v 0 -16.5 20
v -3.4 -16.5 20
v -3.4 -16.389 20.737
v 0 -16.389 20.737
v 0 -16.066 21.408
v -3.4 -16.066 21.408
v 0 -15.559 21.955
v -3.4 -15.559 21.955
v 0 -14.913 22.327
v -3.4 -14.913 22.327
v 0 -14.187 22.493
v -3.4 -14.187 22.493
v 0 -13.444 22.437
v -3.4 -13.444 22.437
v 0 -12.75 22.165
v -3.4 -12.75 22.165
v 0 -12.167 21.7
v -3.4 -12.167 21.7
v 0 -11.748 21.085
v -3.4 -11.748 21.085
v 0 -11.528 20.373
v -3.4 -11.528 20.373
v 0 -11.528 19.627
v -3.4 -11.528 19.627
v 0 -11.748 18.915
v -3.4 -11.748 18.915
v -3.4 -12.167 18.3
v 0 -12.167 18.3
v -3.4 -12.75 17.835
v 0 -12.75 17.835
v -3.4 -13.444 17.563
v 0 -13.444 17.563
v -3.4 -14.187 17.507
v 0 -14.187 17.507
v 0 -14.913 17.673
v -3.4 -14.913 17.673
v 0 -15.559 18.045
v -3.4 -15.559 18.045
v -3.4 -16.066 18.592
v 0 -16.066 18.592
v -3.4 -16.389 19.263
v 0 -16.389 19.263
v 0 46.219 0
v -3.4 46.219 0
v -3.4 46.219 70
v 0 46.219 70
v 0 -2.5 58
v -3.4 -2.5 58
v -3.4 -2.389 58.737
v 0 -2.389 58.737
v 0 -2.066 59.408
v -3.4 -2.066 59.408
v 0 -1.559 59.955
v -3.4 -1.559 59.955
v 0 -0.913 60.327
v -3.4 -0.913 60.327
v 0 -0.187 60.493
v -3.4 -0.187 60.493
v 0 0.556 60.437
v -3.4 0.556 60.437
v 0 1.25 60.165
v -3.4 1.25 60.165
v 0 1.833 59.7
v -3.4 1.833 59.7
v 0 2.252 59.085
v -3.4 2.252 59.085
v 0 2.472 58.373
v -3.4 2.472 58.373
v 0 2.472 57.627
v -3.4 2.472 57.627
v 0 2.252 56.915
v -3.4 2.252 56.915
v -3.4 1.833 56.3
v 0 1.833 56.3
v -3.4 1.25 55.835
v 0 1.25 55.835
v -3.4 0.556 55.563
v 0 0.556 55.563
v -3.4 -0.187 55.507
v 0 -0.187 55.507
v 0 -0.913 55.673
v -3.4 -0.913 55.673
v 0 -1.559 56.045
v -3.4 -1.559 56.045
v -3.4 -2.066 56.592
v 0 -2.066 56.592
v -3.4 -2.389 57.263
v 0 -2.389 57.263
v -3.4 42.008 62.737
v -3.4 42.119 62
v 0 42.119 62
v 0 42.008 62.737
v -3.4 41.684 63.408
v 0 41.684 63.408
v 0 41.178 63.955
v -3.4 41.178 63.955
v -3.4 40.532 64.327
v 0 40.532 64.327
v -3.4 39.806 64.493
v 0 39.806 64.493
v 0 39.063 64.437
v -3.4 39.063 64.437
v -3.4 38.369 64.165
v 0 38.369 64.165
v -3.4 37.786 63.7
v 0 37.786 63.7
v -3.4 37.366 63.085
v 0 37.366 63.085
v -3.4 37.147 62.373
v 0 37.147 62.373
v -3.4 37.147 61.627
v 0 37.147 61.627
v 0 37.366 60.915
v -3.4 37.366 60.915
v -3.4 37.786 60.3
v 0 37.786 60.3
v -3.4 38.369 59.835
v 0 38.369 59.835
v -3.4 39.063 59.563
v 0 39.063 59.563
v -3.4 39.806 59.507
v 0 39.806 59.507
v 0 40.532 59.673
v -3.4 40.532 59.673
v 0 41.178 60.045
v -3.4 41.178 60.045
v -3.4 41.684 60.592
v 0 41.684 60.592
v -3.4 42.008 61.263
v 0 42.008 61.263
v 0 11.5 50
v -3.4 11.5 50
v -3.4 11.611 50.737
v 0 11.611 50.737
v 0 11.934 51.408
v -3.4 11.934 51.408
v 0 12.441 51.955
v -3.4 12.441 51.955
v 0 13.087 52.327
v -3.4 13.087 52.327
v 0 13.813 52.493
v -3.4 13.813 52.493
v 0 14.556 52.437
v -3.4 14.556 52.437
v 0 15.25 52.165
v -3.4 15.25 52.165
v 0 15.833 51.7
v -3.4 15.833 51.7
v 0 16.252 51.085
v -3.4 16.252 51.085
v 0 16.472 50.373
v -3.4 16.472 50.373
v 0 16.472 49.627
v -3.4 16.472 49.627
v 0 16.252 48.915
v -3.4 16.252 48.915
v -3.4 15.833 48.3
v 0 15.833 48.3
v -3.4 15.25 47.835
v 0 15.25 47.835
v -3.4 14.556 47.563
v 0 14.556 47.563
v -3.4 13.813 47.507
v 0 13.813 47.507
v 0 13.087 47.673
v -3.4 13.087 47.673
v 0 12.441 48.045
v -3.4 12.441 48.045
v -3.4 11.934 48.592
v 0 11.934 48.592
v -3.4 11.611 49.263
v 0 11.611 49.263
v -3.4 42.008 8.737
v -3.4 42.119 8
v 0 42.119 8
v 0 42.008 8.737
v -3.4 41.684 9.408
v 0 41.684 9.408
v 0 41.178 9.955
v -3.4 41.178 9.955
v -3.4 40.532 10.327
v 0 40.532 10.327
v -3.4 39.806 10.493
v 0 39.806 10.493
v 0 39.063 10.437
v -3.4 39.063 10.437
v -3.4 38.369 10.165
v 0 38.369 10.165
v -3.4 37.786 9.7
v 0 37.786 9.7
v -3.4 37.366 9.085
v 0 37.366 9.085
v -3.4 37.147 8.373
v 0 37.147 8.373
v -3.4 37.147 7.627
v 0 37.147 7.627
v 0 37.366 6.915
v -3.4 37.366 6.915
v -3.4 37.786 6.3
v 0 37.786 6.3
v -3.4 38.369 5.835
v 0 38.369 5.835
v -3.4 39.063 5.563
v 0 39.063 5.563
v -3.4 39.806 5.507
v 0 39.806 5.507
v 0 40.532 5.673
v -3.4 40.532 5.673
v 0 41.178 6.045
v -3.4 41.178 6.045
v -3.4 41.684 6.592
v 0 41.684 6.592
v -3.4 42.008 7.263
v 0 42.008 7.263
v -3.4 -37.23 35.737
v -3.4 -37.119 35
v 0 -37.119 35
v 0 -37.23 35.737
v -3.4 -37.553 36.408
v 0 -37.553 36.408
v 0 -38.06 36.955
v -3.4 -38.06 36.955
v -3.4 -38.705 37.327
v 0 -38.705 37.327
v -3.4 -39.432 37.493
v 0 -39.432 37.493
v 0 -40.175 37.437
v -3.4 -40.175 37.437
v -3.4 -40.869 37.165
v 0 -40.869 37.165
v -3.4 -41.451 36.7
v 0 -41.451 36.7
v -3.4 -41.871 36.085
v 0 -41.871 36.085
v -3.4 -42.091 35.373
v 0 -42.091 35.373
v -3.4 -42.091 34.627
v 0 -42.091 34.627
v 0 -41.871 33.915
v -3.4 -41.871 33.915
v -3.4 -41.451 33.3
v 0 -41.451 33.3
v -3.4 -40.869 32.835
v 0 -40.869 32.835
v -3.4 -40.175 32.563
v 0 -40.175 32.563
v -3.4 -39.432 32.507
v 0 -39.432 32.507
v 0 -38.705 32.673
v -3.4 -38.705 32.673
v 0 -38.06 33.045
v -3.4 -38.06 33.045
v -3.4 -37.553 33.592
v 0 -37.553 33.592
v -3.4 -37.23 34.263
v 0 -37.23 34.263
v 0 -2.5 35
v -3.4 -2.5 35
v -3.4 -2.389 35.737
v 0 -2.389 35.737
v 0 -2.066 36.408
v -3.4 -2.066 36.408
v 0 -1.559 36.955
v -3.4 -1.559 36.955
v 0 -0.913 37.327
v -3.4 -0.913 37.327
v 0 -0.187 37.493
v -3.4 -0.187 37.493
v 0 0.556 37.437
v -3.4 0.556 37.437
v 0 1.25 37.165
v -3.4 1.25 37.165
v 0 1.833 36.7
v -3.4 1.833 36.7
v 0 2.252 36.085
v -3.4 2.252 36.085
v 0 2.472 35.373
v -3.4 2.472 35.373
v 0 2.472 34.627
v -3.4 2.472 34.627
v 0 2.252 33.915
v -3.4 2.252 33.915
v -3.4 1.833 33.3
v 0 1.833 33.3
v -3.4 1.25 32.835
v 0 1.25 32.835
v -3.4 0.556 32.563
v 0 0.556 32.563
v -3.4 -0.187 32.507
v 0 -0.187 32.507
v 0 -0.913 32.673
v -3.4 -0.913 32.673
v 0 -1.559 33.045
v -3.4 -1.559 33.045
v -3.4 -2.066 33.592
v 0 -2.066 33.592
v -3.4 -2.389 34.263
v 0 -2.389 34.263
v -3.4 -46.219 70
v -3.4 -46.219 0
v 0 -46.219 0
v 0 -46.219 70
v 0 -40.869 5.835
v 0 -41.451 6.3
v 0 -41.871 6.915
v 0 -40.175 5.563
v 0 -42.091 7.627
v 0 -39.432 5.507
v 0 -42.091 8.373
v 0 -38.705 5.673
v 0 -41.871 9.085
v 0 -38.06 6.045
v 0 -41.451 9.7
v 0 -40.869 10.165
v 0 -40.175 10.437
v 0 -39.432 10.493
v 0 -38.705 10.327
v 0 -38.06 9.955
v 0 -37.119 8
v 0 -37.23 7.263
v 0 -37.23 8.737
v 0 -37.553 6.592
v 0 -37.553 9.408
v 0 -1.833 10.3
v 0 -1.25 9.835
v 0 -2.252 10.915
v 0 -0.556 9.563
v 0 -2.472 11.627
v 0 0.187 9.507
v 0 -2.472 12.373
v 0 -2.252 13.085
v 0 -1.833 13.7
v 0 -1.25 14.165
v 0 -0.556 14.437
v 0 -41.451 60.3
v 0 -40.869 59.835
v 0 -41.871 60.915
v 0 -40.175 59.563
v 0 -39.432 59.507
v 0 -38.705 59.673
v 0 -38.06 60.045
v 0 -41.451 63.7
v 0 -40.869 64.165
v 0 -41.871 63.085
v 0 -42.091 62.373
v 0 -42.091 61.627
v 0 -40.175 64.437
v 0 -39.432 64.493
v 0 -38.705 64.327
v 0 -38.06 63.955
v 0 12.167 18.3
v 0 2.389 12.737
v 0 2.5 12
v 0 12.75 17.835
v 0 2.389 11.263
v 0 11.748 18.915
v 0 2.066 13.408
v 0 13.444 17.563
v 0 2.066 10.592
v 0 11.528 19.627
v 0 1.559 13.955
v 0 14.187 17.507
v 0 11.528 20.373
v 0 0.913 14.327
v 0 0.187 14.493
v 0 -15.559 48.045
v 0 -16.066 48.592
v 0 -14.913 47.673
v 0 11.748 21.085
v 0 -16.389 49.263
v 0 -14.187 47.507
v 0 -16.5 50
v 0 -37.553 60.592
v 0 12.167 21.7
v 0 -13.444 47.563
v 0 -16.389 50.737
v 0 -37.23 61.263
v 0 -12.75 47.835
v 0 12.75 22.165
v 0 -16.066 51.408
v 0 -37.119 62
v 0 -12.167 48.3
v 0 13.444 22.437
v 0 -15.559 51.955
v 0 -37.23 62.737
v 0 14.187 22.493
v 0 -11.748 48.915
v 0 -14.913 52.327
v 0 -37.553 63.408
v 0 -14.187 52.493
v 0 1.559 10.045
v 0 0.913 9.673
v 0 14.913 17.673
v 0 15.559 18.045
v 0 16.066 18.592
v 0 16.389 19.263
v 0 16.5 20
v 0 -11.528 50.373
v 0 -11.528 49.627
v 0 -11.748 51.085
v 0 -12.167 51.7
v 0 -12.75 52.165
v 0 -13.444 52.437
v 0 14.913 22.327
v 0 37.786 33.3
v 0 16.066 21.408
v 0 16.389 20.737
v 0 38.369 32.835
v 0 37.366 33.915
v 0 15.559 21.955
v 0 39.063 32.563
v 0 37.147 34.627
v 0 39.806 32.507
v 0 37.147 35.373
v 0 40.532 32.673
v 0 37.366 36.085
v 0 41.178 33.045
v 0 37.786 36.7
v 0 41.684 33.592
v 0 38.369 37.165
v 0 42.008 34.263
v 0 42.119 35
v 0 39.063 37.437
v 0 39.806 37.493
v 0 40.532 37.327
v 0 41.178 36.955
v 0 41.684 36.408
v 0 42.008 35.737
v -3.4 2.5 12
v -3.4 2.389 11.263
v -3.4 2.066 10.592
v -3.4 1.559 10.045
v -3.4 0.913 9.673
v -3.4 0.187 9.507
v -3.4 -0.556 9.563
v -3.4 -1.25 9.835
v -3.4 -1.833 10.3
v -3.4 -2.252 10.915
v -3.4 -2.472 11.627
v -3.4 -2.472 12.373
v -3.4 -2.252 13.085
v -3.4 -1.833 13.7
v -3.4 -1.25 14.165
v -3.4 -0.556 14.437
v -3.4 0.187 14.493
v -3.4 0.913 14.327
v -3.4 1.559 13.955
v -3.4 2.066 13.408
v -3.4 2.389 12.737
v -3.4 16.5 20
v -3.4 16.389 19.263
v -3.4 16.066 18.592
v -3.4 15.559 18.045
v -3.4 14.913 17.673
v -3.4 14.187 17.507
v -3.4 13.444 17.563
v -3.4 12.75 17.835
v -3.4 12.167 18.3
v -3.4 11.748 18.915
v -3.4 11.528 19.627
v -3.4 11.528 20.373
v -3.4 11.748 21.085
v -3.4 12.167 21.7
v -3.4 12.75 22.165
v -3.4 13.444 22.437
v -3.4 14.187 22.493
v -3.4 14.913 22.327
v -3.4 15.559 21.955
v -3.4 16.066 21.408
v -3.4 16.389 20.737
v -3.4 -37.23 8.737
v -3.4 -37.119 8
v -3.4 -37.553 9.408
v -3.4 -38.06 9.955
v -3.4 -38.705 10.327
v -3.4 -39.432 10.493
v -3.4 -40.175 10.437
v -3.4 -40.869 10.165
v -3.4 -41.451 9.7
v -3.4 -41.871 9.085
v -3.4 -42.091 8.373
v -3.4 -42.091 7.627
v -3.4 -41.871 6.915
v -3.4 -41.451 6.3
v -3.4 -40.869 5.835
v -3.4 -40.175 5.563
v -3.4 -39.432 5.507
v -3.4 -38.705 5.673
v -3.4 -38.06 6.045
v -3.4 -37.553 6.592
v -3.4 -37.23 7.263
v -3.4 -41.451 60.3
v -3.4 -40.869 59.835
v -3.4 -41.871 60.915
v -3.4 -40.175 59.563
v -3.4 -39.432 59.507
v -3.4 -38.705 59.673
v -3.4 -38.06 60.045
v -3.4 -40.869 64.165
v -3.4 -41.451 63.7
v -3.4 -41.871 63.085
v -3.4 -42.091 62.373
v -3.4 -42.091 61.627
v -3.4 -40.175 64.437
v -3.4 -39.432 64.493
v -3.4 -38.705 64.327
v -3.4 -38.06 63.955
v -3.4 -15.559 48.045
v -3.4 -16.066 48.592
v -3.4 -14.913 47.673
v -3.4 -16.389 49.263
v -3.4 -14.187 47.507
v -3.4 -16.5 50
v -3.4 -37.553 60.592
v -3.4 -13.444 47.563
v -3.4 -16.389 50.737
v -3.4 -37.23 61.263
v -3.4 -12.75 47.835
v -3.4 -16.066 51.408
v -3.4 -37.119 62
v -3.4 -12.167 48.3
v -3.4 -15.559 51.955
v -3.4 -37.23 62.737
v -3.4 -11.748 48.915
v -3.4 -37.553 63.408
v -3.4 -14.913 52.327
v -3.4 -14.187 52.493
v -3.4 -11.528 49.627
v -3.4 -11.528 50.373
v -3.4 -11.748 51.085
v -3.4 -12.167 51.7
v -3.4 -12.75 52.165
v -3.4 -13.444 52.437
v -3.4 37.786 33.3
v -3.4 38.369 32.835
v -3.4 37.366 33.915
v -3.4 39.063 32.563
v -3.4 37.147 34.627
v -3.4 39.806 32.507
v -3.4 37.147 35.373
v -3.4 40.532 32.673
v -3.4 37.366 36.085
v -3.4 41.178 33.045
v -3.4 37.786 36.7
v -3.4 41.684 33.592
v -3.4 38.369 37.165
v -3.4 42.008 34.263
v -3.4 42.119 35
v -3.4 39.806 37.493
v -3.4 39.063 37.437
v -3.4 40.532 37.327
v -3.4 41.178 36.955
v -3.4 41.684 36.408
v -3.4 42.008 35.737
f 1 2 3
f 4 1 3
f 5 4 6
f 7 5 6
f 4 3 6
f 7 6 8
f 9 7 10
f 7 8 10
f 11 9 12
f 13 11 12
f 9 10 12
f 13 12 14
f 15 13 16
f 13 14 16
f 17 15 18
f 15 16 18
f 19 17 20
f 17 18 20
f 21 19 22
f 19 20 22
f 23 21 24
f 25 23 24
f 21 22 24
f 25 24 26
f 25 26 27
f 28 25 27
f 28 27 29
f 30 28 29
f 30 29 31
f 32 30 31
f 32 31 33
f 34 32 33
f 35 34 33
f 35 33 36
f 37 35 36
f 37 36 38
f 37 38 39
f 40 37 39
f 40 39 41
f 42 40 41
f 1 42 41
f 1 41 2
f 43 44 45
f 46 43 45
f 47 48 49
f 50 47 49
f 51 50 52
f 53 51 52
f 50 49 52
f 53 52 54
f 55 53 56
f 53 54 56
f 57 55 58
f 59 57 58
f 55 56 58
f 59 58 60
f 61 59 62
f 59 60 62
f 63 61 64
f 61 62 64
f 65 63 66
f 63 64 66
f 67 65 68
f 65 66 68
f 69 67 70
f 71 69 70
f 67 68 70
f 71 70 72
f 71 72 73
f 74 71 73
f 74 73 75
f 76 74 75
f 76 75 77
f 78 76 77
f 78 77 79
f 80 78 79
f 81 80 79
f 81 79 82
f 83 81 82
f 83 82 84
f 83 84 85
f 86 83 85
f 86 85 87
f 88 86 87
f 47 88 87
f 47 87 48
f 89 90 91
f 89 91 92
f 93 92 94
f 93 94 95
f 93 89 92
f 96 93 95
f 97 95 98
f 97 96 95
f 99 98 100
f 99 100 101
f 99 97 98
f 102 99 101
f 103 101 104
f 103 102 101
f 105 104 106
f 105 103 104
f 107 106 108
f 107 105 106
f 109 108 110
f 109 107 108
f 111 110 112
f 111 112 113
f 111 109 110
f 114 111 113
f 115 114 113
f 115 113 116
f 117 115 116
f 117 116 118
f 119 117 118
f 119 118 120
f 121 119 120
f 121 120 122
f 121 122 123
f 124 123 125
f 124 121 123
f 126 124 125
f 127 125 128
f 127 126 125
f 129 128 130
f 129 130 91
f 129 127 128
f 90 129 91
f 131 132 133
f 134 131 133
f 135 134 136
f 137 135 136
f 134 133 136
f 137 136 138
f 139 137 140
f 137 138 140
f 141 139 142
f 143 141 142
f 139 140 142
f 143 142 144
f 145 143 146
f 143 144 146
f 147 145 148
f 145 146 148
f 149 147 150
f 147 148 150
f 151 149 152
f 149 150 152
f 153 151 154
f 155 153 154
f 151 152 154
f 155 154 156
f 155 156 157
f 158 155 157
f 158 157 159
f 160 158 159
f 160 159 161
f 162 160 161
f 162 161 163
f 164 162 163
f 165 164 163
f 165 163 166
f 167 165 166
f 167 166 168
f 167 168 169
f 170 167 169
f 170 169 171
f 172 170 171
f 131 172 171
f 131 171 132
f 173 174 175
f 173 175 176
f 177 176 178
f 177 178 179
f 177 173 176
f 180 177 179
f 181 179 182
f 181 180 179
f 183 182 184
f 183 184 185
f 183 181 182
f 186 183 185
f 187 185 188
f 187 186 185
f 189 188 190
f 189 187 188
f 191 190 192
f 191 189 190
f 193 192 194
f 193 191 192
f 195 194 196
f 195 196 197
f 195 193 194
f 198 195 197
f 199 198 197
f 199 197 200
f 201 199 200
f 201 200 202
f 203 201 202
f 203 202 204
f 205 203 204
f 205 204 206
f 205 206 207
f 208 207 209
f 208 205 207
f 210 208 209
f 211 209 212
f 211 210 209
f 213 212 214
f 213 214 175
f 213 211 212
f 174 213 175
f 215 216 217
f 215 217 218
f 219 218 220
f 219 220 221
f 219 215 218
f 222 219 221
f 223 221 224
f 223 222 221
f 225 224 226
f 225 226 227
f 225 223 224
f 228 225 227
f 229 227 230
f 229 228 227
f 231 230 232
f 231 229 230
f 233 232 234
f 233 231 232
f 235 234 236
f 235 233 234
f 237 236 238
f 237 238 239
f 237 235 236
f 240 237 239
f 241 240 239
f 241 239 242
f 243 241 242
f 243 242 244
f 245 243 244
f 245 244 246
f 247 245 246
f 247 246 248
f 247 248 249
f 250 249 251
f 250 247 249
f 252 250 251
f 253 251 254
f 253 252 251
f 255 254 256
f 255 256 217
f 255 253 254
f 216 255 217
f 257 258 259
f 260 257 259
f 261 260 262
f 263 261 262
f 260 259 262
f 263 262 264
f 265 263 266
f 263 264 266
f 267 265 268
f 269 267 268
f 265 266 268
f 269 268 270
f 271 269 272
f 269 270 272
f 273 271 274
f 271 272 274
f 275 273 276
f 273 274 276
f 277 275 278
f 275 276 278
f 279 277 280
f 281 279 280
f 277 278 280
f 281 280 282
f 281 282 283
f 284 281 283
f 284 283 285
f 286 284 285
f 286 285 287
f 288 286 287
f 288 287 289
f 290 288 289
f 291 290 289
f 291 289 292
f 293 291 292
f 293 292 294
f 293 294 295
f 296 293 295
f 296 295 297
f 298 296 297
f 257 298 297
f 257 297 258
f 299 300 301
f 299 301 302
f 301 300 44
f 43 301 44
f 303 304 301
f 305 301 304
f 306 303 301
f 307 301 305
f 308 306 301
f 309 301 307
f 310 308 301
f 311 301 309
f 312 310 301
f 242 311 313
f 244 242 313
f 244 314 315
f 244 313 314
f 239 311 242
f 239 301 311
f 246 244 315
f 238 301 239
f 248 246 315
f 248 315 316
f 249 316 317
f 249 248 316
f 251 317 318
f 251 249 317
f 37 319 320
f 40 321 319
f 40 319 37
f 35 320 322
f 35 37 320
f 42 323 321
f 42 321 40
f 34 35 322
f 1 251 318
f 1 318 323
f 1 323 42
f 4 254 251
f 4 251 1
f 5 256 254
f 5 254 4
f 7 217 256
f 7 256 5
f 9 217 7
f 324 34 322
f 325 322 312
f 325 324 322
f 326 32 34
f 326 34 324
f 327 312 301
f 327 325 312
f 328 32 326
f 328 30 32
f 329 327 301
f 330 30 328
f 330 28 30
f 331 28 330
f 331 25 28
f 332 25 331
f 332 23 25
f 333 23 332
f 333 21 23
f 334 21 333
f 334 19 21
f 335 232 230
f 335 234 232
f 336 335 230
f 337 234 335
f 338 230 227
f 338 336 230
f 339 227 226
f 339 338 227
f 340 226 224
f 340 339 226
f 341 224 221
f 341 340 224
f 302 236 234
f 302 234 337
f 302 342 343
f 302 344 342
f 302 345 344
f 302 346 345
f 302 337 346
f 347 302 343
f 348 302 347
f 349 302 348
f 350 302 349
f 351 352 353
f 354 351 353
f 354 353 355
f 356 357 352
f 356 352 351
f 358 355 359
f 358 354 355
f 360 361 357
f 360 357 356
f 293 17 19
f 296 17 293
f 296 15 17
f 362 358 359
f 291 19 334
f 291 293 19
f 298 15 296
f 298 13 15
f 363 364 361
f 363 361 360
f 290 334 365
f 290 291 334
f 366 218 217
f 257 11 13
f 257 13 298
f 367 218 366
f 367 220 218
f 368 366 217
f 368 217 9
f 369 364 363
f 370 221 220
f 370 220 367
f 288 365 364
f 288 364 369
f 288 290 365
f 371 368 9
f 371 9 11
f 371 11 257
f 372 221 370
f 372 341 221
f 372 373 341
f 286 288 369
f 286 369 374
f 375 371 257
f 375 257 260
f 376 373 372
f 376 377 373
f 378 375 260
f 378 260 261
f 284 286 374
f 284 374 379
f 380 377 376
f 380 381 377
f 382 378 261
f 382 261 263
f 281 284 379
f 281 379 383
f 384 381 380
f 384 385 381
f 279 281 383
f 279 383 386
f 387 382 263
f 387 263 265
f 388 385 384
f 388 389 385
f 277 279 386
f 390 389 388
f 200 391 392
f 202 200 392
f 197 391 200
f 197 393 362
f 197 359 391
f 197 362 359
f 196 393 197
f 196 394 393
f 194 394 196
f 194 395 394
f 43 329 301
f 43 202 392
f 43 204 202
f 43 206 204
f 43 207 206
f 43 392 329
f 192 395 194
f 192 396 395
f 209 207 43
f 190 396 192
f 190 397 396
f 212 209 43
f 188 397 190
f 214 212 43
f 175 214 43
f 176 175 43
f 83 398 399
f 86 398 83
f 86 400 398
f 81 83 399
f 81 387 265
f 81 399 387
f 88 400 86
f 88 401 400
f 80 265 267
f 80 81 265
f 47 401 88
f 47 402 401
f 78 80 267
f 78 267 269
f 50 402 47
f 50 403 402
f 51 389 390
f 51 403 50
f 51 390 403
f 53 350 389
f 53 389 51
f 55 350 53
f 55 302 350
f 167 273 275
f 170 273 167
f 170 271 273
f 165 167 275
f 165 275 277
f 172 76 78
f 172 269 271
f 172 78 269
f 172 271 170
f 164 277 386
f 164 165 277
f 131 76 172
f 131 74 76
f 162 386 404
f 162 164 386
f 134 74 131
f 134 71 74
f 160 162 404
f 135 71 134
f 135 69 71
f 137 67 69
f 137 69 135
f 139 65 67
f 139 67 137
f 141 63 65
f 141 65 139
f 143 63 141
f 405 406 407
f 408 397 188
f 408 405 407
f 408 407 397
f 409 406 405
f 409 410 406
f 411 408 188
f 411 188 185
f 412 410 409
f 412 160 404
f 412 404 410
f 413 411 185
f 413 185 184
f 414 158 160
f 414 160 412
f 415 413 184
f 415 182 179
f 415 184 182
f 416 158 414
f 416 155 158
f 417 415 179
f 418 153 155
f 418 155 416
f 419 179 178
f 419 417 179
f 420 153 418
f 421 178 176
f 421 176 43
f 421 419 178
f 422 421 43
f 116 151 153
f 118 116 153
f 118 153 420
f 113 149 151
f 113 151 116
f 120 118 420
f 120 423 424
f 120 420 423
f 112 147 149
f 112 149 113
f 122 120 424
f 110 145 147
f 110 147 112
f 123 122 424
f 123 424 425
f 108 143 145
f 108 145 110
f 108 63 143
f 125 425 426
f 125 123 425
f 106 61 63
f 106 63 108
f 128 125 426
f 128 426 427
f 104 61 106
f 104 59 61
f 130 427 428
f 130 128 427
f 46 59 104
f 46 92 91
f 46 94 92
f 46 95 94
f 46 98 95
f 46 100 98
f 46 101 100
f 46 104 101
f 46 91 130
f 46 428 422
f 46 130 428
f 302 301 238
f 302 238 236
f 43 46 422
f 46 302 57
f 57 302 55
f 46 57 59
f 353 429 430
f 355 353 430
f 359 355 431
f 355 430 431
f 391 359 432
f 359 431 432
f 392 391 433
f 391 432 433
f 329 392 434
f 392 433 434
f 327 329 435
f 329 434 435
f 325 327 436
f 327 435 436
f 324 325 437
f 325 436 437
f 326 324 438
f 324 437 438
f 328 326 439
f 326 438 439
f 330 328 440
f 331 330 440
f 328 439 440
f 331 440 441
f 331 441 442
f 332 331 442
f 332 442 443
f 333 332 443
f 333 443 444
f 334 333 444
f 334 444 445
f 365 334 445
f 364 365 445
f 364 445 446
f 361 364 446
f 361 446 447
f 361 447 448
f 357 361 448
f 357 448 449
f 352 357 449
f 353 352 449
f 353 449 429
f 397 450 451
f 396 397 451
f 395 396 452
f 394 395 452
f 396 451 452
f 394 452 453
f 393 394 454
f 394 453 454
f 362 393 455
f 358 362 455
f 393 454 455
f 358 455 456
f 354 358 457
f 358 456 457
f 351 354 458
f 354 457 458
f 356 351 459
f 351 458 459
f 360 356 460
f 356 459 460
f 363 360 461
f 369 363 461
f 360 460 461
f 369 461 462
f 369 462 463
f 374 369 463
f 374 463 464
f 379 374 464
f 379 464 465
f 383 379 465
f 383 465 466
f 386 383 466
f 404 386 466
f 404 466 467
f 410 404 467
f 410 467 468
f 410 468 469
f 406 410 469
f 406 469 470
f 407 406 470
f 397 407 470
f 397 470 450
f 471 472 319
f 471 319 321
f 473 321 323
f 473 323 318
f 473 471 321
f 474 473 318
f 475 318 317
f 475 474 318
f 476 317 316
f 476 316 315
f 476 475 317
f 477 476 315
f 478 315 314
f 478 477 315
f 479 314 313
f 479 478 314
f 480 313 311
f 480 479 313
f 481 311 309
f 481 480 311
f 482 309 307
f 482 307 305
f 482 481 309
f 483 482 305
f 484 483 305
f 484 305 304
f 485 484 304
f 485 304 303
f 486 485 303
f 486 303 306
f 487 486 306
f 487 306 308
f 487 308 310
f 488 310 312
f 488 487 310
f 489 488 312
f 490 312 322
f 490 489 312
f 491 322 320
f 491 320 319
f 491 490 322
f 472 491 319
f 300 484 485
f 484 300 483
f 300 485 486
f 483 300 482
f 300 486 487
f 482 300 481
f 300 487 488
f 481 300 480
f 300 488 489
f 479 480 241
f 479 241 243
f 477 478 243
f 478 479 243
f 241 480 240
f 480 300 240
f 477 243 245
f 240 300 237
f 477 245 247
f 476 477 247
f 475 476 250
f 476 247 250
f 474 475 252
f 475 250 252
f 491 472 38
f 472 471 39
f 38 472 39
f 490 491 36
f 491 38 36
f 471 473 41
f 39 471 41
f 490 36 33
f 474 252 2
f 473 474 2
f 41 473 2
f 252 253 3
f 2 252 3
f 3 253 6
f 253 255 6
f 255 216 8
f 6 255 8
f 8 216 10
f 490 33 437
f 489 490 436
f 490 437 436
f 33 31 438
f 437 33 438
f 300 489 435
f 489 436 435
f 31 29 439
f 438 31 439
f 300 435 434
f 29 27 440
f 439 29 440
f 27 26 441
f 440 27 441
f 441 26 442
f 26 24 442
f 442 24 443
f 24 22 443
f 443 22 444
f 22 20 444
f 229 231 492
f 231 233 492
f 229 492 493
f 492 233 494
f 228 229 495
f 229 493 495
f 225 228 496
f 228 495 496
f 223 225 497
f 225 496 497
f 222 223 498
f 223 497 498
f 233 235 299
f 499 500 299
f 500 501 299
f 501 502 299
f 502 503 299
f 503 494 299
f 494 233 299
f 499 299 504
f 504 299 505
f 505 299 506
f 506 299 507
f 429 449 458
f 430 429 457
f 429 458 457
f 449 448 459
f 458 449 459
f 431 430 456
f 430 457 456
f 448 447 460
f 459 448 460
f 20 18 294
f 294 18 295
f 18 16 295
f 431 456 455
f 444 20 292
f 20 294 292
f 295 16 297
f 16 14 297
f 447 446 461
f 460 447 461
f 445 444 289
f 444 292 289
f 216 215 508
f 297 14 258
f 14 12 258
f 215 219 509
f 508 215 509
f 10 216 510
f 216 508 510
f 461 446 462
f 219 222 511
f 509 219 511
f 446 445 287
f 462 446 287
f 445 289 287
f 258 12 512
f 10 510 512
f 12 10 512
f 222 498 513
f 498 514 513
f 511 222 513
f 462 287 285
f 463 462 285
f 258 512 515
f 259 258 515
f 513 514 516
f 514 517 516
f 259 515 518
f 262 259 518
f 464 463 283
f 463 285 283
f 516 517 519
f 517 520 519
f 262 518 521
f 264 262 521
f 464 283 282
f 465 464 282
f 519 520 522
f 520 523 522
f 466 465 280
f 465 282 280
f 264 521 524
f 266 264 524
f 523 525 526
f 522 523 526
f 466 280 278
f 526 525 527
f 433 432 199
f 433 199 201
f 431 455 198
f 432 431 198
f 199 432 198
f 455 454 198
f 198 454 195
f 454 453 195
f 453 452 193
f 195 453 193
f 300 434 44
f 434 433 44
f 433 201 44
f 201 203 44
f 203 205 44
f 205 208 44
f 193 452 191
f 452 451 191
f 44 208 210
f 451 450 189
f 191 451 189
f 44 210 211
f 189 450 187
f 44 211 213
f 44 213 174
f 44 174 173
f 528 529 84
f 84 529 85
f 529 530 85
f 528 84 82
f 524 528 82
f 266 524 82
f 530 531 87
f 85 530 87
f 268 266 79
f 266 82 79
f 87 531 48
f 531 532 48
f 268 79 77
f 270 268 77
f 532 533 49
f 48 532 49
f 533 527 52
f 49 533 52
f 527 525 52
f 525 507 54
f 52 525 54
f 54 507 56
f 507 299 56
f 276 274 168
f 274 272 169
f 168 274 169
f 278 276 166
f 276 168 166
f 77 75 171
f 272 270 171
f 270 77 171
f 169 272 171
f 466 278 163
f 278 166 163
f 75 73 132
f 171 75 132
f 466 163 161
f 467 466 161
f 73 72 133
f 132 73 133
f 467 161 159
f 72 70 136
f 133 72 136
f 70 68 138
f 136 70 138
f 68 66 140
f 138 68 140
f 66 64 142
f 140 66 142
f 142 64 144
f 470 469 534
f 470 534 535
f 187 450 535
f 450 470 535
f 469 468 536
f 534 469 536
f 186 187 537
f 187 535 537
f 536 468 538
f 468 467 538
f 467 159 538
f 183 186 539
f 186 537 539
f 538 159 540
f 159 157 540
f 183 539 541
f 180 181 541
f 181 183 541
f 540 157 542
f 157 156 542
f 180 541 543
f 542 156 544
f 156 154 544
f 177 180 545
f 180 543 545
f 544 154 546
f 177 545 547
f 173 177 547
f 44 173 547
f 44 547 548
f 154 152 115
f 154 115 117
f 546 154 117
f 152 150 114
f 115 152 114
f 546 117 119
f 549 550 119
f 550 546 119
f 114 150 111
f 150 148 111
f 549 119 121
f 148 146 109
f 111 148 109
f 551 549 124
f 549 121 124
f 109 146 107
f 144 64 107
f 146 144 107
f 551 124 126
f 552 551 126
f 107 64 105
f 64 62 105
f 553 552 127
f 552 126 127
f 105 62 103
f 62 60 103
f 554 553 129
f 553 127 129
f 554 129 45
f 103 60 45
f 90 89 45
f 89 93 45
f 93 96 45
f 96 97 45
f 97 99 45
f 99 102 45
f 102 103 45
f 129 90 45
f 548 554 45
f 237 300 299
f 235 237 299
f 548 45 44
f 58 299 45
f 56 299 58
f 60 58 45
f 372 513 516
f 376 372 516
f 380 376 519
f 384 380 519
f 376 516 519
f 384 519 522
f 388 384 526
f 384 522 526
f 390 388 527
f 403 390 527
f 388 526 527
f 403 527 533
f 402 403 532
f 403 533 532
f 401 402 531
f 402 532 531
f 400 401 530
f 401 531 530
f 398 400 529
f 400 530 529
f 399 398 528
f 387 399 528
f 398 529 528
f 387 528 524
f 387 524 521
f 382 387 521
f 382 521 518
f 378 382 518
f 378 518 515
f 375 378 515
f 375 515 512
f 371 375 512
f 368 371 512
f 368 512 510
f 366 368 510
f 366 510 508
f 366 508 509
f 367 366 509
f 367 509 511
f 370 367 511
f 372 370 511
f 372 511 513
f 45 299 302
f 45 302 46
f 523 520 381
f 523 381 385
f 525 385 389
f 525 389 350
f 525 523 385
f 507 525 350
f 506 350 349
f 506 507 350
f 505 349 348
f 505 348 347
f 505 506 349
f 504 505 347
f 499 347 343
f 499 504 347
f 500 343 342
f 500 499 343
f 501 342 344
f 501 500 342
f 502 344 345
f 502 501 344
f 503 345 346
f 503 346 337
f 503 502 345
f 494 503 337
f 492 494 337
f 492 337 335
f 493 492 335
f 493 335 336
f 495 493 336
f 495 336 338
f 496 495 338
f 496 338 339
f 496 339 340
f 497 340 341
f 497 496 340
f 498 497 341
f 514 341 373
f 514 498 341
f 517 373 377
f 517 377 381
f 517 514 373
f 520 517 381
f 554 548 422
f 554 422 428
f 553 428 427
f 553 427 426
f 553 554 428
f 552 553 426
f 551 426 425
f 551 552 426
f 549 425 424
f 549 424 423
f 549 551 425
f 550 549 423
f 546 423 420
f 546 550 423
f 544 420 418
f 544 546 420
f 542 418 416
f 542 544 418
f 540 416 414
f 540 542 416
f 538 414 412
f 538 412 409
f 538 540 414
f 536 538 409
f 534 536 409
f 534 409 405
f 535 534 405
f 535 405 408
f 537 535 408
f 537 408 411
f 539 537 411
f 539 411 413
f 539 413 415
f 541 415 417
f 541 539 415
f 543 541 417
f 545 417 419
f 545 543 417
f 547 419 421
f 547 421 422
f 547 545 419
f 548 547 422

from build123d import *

# Parameters (mm, degrees)
SKETCH11_W                     = 3.4
SKETCH11_H                     = 52
BASE_FLANGE3_DEPTH             = 70
EDGE_FLANGE1_STRIP_W           = 15.1
EDGE_FLANGE1_STRIP_H           = 3.4
EDGE_FLANGE1_STRIP_CUT_DEPTH   = 70
EDGE_FLANGE1_STRIP_2_W         = 15.1
EDGE_FLANGE1_STRIP_2_H         = 3.4
EDGE_FLANGE1_STRIP_CUT_2_DEPTH = 70
EDGE_FLANGE1_DEPTH             = 70
EDGE_FLANGE1_BEND_DEPTH        = 70
CUT_EXTRUDE1_DEPTH             = 89.011135659
CUT_EXTRUDE1_DEPTH_BACK        = 89.011135659
SKETCH25_R                     = 2.5
SKETCH23_R                     = 2.5
CUT_EXTRUDE2_DEPTH             = 77.954272136
UNFOLD1_START                  = -22
UNFOLD1_OUTLINE_W              = 4.15
UNFOLD1_OUTLINE_H              = 70
UNFOLD1_DEPTH                  = 18.6
UNFOLD1_START_2                = -3.4
UNFOLD1_2_OUTLINE_W            = 24.368804756
UNFOLD1_2_OUTLINE_H            = 70
UNFOLD1_2_OUTLINE_R            = 2.5
UNFOLD1_2_DEPTH                = 3.4


with BuildPart() as part:
    # Base-Flange3: sheet metal written as solids
    # Sketch11 → Base-Flange3 (new body)
    with BuildSketch(Plane.XY):
        with Locations((-1.7, 0)):
            Rectangle(SKETCH11_W, SKETCH11_H)
    extrude(amount=BASE_FLANGE3_DEPTH)

    # Edge-Flange1: sheet metal written as solids
    # Edge-Flange1 strip (on a plane across the edge) → Edge-Flange1 strip cut (cut)
    with BuildSketch(Plane(origin=(-3.4, 26, 70), x_dir=(0, -1, 0), z_dir=(0, 0, -1))):
        with Locations((-3.4, -1.7)):
            Rectangle(EDGE_FLANGE1_STRIP_W, EDGE_FLANGE1_STRIP_H)
    extrude(amount=EDGE_FLANGE1_STRIP_CUT_DEPTH, mode=Mode.SUBTRACT)

    # Edge-Flange1 strip 2 (on a plane across the edge) → Edge-Flange1 strip cut 2 (cut)
    with BuildSketch(Plane(origin=(-3.4, -26, 0), x_dir=(0, 1, 0), z_dir=(0, 0, 1))):
        with Locations((-3.4, -1.7)):
            Rectangle(EDGE_FLANGE1_STRIP_2_W, EDGE_FLANGE1_STRIP_2_H)
    extrude(amount=EDGE_FLANGE1_STRIP_CUT_2_DEPTH, mode=Mode.SUBTRACT)

    # Edge-Flange1 section (on a plane across the edge) → Edge-Flange1 (add)
    with BuildSketch(Plane(origin=(-3.4, 26, 70), x_dir=(0, -1, 0), z_dir=(0, 0, -1))):
        with BuildLine():
            Line((0, 0.75), (0, 18.6))
            Line((0, 18.6), (3.4, 18.6))
            Line((3.4, 18.6), (3.4, 0.75))
            ThreePointArc((3.4, 0.75), (3.619669914, 0.219669914), (4.15, 0))
            Line((4.15, 0), (4.15, -3.4))
            ThreePointArc((4.15, -3.4), (1.215506858, -2.184493142), (0, 0.75))
        make_face()
    extrude(amount=EDGE_FLANGE1_DEPTH)

    # Edge-Flange1 section 2 (on a plane across the edge) → Edge-Flange1 bend (add)
    with BuildSketch(Plane(origin=(-3.4, -26, 0), x_dir=(0, 1, 0), z_dir=(0, 0, 1))):
        with BuildLine():
            Line((0, 0.75), (0, 18.6))
            Line((0, 18.6), (3.4, 18.6))
            Line((3.4, 18.6), (3.4, 0.75))
            ThreePointArc((3.4, 0.75), (3.619669914, 0.219669914), (4.15, 0))
            Line((4.15, 0), (4.15, -3.4))
            ThreePointArc((4.15, -3.4), (1.215506858, -2.184493142), (0, 0.75))
        make_face()
    extrude(amount=EDGE_FLANGE1_BEND_DEPTH)

    # Sketch25 → Cut-Extrude1 (cut, two sides: drawn at the far end of the back side and taken through both)
    with BuildSketch(Plane.XZ.offset(-22.6).offset(-CUT_EXTRUDE1_DEPTH_BACK)):
        with Locations((-15.4, 35)):
            Circle(SKETCH25_R)
        with Locations((-15.4, 8)):
            Circle(SKETCH25_R)
        with Locations(Location((-15.4, 62, 0), (0, 0, 180))):
            Circle(SKETCH25_R)
    extrude(amount=CUT_EXTRUDE1_DEPTH + CUT_EXTRUDE1_DEPTH_BACK, mode=Mode.SUBTRACT)

    # Sketch23 → Cut-Extrude2 (cut, through all)
    with BuildSketch(Plane.ZY.offset(3.4)):
        with Locations(Location((20, -14, 0), (0, 0, 270))):
            Circle(SKETCH23_R)
        with Locations(Location((50, -14, 0), (0, 0, 270))):
            Circle(SKETCH23_R)
        with Locations(Location((20, 14, 0), (0, 0, 90))):
            Circle(SKETCH23_R)
        with Locations(Location((50, 14, 0), (0, 0, 270))):
            Circle(SKETCH23_R)
        with Locations(Location((35, 0, 0), (0, 0, 270))):
            Circle(SKETCH23_R)
        with Locations(Location((58, 0, 0), (0, 0, 270))):
            Circle(SKETCH23_R)
        with Locations(Location((12, 0, 0), (0, 0, 90))):
            Circle(SKETCH23_R)
    extrude(amount=-CUT_EXTRUDE2_DEPTH, mode=Mode.SUBTRACT)

    # Unfold1: read off the stored shape, not the designer's step
    # Unfold1 outline → Unfold1 (cut)
    with BuildSketch(Plane.YZ.offset(UNFOLD1_START)):
        with Locations((-23.925, 35)):
            Rectangle(UNFOLD1_OUTLINE_W, UNFOLD1_OUTLINE_H)
        with Locations((23.925, 35)):
            Rectangle(UNFOLD1_OUTLINE_W, UNFOLD1_OUTLINE_H)
    extrude(amount=UNFOLD1_DEPTH, mode=Mode.SUBTRACT)

    # Unfold1 2 outline → Unfold1 2 (add)
    # profile 1 of 2: a face of its own
    with BuildSketch(Plane.YZ.offset(UNFOLD1_START_2)):
        with Locations((-34.034402378, 35)):
            Rectangle(UNFOLD1_2_OUTLINE_W, UNFOLD1_2_OUTLINE_H)
        with Locations((-39.618804756, 8)):
            Circle(UNFOLD1_2_OUTLINE_R, mode=Mode.SUBTRACT)
        with Locations((-39.618804756, 35)):
            Circle(UNFOLD1_2_OUTLINE_R, mode=Mode.SUBTRACT)
        with Locations((-39.618804756, 62)):
            Circle(UNFOLD1_2_OUTLINE_R, mode=Mode.SUBTRACT)
    # profile 2 of 2: a face of its own
    with BuildSketch(Plane.YZ.offset(UNFOLD1_START_2)):
        with Locations((34.034402378, 35)):
            Rectangle(UNFOLD1_2_OUTLINE_W, UNFOLD1_2_OUTLINE_H)
        with Locations((39.618804756, 8)):
            Circle(UNFOLD1_2_OUTLINE_R, mode=Mode.SUBTRACT)
        with Locations((39.618804756, 35)):
            Circle(UNFOLD1_2_OUTLINE_R, mode=Mode.SUBTRACT)
        with Locations((39.618804756, 62)):
            Circle(UNFOLD1_2_OUTLINE_R, mode=Mode.SUBTRACT)
    extrude(amount=UNFOLD1_2_DEPTH)


solid = part.part
